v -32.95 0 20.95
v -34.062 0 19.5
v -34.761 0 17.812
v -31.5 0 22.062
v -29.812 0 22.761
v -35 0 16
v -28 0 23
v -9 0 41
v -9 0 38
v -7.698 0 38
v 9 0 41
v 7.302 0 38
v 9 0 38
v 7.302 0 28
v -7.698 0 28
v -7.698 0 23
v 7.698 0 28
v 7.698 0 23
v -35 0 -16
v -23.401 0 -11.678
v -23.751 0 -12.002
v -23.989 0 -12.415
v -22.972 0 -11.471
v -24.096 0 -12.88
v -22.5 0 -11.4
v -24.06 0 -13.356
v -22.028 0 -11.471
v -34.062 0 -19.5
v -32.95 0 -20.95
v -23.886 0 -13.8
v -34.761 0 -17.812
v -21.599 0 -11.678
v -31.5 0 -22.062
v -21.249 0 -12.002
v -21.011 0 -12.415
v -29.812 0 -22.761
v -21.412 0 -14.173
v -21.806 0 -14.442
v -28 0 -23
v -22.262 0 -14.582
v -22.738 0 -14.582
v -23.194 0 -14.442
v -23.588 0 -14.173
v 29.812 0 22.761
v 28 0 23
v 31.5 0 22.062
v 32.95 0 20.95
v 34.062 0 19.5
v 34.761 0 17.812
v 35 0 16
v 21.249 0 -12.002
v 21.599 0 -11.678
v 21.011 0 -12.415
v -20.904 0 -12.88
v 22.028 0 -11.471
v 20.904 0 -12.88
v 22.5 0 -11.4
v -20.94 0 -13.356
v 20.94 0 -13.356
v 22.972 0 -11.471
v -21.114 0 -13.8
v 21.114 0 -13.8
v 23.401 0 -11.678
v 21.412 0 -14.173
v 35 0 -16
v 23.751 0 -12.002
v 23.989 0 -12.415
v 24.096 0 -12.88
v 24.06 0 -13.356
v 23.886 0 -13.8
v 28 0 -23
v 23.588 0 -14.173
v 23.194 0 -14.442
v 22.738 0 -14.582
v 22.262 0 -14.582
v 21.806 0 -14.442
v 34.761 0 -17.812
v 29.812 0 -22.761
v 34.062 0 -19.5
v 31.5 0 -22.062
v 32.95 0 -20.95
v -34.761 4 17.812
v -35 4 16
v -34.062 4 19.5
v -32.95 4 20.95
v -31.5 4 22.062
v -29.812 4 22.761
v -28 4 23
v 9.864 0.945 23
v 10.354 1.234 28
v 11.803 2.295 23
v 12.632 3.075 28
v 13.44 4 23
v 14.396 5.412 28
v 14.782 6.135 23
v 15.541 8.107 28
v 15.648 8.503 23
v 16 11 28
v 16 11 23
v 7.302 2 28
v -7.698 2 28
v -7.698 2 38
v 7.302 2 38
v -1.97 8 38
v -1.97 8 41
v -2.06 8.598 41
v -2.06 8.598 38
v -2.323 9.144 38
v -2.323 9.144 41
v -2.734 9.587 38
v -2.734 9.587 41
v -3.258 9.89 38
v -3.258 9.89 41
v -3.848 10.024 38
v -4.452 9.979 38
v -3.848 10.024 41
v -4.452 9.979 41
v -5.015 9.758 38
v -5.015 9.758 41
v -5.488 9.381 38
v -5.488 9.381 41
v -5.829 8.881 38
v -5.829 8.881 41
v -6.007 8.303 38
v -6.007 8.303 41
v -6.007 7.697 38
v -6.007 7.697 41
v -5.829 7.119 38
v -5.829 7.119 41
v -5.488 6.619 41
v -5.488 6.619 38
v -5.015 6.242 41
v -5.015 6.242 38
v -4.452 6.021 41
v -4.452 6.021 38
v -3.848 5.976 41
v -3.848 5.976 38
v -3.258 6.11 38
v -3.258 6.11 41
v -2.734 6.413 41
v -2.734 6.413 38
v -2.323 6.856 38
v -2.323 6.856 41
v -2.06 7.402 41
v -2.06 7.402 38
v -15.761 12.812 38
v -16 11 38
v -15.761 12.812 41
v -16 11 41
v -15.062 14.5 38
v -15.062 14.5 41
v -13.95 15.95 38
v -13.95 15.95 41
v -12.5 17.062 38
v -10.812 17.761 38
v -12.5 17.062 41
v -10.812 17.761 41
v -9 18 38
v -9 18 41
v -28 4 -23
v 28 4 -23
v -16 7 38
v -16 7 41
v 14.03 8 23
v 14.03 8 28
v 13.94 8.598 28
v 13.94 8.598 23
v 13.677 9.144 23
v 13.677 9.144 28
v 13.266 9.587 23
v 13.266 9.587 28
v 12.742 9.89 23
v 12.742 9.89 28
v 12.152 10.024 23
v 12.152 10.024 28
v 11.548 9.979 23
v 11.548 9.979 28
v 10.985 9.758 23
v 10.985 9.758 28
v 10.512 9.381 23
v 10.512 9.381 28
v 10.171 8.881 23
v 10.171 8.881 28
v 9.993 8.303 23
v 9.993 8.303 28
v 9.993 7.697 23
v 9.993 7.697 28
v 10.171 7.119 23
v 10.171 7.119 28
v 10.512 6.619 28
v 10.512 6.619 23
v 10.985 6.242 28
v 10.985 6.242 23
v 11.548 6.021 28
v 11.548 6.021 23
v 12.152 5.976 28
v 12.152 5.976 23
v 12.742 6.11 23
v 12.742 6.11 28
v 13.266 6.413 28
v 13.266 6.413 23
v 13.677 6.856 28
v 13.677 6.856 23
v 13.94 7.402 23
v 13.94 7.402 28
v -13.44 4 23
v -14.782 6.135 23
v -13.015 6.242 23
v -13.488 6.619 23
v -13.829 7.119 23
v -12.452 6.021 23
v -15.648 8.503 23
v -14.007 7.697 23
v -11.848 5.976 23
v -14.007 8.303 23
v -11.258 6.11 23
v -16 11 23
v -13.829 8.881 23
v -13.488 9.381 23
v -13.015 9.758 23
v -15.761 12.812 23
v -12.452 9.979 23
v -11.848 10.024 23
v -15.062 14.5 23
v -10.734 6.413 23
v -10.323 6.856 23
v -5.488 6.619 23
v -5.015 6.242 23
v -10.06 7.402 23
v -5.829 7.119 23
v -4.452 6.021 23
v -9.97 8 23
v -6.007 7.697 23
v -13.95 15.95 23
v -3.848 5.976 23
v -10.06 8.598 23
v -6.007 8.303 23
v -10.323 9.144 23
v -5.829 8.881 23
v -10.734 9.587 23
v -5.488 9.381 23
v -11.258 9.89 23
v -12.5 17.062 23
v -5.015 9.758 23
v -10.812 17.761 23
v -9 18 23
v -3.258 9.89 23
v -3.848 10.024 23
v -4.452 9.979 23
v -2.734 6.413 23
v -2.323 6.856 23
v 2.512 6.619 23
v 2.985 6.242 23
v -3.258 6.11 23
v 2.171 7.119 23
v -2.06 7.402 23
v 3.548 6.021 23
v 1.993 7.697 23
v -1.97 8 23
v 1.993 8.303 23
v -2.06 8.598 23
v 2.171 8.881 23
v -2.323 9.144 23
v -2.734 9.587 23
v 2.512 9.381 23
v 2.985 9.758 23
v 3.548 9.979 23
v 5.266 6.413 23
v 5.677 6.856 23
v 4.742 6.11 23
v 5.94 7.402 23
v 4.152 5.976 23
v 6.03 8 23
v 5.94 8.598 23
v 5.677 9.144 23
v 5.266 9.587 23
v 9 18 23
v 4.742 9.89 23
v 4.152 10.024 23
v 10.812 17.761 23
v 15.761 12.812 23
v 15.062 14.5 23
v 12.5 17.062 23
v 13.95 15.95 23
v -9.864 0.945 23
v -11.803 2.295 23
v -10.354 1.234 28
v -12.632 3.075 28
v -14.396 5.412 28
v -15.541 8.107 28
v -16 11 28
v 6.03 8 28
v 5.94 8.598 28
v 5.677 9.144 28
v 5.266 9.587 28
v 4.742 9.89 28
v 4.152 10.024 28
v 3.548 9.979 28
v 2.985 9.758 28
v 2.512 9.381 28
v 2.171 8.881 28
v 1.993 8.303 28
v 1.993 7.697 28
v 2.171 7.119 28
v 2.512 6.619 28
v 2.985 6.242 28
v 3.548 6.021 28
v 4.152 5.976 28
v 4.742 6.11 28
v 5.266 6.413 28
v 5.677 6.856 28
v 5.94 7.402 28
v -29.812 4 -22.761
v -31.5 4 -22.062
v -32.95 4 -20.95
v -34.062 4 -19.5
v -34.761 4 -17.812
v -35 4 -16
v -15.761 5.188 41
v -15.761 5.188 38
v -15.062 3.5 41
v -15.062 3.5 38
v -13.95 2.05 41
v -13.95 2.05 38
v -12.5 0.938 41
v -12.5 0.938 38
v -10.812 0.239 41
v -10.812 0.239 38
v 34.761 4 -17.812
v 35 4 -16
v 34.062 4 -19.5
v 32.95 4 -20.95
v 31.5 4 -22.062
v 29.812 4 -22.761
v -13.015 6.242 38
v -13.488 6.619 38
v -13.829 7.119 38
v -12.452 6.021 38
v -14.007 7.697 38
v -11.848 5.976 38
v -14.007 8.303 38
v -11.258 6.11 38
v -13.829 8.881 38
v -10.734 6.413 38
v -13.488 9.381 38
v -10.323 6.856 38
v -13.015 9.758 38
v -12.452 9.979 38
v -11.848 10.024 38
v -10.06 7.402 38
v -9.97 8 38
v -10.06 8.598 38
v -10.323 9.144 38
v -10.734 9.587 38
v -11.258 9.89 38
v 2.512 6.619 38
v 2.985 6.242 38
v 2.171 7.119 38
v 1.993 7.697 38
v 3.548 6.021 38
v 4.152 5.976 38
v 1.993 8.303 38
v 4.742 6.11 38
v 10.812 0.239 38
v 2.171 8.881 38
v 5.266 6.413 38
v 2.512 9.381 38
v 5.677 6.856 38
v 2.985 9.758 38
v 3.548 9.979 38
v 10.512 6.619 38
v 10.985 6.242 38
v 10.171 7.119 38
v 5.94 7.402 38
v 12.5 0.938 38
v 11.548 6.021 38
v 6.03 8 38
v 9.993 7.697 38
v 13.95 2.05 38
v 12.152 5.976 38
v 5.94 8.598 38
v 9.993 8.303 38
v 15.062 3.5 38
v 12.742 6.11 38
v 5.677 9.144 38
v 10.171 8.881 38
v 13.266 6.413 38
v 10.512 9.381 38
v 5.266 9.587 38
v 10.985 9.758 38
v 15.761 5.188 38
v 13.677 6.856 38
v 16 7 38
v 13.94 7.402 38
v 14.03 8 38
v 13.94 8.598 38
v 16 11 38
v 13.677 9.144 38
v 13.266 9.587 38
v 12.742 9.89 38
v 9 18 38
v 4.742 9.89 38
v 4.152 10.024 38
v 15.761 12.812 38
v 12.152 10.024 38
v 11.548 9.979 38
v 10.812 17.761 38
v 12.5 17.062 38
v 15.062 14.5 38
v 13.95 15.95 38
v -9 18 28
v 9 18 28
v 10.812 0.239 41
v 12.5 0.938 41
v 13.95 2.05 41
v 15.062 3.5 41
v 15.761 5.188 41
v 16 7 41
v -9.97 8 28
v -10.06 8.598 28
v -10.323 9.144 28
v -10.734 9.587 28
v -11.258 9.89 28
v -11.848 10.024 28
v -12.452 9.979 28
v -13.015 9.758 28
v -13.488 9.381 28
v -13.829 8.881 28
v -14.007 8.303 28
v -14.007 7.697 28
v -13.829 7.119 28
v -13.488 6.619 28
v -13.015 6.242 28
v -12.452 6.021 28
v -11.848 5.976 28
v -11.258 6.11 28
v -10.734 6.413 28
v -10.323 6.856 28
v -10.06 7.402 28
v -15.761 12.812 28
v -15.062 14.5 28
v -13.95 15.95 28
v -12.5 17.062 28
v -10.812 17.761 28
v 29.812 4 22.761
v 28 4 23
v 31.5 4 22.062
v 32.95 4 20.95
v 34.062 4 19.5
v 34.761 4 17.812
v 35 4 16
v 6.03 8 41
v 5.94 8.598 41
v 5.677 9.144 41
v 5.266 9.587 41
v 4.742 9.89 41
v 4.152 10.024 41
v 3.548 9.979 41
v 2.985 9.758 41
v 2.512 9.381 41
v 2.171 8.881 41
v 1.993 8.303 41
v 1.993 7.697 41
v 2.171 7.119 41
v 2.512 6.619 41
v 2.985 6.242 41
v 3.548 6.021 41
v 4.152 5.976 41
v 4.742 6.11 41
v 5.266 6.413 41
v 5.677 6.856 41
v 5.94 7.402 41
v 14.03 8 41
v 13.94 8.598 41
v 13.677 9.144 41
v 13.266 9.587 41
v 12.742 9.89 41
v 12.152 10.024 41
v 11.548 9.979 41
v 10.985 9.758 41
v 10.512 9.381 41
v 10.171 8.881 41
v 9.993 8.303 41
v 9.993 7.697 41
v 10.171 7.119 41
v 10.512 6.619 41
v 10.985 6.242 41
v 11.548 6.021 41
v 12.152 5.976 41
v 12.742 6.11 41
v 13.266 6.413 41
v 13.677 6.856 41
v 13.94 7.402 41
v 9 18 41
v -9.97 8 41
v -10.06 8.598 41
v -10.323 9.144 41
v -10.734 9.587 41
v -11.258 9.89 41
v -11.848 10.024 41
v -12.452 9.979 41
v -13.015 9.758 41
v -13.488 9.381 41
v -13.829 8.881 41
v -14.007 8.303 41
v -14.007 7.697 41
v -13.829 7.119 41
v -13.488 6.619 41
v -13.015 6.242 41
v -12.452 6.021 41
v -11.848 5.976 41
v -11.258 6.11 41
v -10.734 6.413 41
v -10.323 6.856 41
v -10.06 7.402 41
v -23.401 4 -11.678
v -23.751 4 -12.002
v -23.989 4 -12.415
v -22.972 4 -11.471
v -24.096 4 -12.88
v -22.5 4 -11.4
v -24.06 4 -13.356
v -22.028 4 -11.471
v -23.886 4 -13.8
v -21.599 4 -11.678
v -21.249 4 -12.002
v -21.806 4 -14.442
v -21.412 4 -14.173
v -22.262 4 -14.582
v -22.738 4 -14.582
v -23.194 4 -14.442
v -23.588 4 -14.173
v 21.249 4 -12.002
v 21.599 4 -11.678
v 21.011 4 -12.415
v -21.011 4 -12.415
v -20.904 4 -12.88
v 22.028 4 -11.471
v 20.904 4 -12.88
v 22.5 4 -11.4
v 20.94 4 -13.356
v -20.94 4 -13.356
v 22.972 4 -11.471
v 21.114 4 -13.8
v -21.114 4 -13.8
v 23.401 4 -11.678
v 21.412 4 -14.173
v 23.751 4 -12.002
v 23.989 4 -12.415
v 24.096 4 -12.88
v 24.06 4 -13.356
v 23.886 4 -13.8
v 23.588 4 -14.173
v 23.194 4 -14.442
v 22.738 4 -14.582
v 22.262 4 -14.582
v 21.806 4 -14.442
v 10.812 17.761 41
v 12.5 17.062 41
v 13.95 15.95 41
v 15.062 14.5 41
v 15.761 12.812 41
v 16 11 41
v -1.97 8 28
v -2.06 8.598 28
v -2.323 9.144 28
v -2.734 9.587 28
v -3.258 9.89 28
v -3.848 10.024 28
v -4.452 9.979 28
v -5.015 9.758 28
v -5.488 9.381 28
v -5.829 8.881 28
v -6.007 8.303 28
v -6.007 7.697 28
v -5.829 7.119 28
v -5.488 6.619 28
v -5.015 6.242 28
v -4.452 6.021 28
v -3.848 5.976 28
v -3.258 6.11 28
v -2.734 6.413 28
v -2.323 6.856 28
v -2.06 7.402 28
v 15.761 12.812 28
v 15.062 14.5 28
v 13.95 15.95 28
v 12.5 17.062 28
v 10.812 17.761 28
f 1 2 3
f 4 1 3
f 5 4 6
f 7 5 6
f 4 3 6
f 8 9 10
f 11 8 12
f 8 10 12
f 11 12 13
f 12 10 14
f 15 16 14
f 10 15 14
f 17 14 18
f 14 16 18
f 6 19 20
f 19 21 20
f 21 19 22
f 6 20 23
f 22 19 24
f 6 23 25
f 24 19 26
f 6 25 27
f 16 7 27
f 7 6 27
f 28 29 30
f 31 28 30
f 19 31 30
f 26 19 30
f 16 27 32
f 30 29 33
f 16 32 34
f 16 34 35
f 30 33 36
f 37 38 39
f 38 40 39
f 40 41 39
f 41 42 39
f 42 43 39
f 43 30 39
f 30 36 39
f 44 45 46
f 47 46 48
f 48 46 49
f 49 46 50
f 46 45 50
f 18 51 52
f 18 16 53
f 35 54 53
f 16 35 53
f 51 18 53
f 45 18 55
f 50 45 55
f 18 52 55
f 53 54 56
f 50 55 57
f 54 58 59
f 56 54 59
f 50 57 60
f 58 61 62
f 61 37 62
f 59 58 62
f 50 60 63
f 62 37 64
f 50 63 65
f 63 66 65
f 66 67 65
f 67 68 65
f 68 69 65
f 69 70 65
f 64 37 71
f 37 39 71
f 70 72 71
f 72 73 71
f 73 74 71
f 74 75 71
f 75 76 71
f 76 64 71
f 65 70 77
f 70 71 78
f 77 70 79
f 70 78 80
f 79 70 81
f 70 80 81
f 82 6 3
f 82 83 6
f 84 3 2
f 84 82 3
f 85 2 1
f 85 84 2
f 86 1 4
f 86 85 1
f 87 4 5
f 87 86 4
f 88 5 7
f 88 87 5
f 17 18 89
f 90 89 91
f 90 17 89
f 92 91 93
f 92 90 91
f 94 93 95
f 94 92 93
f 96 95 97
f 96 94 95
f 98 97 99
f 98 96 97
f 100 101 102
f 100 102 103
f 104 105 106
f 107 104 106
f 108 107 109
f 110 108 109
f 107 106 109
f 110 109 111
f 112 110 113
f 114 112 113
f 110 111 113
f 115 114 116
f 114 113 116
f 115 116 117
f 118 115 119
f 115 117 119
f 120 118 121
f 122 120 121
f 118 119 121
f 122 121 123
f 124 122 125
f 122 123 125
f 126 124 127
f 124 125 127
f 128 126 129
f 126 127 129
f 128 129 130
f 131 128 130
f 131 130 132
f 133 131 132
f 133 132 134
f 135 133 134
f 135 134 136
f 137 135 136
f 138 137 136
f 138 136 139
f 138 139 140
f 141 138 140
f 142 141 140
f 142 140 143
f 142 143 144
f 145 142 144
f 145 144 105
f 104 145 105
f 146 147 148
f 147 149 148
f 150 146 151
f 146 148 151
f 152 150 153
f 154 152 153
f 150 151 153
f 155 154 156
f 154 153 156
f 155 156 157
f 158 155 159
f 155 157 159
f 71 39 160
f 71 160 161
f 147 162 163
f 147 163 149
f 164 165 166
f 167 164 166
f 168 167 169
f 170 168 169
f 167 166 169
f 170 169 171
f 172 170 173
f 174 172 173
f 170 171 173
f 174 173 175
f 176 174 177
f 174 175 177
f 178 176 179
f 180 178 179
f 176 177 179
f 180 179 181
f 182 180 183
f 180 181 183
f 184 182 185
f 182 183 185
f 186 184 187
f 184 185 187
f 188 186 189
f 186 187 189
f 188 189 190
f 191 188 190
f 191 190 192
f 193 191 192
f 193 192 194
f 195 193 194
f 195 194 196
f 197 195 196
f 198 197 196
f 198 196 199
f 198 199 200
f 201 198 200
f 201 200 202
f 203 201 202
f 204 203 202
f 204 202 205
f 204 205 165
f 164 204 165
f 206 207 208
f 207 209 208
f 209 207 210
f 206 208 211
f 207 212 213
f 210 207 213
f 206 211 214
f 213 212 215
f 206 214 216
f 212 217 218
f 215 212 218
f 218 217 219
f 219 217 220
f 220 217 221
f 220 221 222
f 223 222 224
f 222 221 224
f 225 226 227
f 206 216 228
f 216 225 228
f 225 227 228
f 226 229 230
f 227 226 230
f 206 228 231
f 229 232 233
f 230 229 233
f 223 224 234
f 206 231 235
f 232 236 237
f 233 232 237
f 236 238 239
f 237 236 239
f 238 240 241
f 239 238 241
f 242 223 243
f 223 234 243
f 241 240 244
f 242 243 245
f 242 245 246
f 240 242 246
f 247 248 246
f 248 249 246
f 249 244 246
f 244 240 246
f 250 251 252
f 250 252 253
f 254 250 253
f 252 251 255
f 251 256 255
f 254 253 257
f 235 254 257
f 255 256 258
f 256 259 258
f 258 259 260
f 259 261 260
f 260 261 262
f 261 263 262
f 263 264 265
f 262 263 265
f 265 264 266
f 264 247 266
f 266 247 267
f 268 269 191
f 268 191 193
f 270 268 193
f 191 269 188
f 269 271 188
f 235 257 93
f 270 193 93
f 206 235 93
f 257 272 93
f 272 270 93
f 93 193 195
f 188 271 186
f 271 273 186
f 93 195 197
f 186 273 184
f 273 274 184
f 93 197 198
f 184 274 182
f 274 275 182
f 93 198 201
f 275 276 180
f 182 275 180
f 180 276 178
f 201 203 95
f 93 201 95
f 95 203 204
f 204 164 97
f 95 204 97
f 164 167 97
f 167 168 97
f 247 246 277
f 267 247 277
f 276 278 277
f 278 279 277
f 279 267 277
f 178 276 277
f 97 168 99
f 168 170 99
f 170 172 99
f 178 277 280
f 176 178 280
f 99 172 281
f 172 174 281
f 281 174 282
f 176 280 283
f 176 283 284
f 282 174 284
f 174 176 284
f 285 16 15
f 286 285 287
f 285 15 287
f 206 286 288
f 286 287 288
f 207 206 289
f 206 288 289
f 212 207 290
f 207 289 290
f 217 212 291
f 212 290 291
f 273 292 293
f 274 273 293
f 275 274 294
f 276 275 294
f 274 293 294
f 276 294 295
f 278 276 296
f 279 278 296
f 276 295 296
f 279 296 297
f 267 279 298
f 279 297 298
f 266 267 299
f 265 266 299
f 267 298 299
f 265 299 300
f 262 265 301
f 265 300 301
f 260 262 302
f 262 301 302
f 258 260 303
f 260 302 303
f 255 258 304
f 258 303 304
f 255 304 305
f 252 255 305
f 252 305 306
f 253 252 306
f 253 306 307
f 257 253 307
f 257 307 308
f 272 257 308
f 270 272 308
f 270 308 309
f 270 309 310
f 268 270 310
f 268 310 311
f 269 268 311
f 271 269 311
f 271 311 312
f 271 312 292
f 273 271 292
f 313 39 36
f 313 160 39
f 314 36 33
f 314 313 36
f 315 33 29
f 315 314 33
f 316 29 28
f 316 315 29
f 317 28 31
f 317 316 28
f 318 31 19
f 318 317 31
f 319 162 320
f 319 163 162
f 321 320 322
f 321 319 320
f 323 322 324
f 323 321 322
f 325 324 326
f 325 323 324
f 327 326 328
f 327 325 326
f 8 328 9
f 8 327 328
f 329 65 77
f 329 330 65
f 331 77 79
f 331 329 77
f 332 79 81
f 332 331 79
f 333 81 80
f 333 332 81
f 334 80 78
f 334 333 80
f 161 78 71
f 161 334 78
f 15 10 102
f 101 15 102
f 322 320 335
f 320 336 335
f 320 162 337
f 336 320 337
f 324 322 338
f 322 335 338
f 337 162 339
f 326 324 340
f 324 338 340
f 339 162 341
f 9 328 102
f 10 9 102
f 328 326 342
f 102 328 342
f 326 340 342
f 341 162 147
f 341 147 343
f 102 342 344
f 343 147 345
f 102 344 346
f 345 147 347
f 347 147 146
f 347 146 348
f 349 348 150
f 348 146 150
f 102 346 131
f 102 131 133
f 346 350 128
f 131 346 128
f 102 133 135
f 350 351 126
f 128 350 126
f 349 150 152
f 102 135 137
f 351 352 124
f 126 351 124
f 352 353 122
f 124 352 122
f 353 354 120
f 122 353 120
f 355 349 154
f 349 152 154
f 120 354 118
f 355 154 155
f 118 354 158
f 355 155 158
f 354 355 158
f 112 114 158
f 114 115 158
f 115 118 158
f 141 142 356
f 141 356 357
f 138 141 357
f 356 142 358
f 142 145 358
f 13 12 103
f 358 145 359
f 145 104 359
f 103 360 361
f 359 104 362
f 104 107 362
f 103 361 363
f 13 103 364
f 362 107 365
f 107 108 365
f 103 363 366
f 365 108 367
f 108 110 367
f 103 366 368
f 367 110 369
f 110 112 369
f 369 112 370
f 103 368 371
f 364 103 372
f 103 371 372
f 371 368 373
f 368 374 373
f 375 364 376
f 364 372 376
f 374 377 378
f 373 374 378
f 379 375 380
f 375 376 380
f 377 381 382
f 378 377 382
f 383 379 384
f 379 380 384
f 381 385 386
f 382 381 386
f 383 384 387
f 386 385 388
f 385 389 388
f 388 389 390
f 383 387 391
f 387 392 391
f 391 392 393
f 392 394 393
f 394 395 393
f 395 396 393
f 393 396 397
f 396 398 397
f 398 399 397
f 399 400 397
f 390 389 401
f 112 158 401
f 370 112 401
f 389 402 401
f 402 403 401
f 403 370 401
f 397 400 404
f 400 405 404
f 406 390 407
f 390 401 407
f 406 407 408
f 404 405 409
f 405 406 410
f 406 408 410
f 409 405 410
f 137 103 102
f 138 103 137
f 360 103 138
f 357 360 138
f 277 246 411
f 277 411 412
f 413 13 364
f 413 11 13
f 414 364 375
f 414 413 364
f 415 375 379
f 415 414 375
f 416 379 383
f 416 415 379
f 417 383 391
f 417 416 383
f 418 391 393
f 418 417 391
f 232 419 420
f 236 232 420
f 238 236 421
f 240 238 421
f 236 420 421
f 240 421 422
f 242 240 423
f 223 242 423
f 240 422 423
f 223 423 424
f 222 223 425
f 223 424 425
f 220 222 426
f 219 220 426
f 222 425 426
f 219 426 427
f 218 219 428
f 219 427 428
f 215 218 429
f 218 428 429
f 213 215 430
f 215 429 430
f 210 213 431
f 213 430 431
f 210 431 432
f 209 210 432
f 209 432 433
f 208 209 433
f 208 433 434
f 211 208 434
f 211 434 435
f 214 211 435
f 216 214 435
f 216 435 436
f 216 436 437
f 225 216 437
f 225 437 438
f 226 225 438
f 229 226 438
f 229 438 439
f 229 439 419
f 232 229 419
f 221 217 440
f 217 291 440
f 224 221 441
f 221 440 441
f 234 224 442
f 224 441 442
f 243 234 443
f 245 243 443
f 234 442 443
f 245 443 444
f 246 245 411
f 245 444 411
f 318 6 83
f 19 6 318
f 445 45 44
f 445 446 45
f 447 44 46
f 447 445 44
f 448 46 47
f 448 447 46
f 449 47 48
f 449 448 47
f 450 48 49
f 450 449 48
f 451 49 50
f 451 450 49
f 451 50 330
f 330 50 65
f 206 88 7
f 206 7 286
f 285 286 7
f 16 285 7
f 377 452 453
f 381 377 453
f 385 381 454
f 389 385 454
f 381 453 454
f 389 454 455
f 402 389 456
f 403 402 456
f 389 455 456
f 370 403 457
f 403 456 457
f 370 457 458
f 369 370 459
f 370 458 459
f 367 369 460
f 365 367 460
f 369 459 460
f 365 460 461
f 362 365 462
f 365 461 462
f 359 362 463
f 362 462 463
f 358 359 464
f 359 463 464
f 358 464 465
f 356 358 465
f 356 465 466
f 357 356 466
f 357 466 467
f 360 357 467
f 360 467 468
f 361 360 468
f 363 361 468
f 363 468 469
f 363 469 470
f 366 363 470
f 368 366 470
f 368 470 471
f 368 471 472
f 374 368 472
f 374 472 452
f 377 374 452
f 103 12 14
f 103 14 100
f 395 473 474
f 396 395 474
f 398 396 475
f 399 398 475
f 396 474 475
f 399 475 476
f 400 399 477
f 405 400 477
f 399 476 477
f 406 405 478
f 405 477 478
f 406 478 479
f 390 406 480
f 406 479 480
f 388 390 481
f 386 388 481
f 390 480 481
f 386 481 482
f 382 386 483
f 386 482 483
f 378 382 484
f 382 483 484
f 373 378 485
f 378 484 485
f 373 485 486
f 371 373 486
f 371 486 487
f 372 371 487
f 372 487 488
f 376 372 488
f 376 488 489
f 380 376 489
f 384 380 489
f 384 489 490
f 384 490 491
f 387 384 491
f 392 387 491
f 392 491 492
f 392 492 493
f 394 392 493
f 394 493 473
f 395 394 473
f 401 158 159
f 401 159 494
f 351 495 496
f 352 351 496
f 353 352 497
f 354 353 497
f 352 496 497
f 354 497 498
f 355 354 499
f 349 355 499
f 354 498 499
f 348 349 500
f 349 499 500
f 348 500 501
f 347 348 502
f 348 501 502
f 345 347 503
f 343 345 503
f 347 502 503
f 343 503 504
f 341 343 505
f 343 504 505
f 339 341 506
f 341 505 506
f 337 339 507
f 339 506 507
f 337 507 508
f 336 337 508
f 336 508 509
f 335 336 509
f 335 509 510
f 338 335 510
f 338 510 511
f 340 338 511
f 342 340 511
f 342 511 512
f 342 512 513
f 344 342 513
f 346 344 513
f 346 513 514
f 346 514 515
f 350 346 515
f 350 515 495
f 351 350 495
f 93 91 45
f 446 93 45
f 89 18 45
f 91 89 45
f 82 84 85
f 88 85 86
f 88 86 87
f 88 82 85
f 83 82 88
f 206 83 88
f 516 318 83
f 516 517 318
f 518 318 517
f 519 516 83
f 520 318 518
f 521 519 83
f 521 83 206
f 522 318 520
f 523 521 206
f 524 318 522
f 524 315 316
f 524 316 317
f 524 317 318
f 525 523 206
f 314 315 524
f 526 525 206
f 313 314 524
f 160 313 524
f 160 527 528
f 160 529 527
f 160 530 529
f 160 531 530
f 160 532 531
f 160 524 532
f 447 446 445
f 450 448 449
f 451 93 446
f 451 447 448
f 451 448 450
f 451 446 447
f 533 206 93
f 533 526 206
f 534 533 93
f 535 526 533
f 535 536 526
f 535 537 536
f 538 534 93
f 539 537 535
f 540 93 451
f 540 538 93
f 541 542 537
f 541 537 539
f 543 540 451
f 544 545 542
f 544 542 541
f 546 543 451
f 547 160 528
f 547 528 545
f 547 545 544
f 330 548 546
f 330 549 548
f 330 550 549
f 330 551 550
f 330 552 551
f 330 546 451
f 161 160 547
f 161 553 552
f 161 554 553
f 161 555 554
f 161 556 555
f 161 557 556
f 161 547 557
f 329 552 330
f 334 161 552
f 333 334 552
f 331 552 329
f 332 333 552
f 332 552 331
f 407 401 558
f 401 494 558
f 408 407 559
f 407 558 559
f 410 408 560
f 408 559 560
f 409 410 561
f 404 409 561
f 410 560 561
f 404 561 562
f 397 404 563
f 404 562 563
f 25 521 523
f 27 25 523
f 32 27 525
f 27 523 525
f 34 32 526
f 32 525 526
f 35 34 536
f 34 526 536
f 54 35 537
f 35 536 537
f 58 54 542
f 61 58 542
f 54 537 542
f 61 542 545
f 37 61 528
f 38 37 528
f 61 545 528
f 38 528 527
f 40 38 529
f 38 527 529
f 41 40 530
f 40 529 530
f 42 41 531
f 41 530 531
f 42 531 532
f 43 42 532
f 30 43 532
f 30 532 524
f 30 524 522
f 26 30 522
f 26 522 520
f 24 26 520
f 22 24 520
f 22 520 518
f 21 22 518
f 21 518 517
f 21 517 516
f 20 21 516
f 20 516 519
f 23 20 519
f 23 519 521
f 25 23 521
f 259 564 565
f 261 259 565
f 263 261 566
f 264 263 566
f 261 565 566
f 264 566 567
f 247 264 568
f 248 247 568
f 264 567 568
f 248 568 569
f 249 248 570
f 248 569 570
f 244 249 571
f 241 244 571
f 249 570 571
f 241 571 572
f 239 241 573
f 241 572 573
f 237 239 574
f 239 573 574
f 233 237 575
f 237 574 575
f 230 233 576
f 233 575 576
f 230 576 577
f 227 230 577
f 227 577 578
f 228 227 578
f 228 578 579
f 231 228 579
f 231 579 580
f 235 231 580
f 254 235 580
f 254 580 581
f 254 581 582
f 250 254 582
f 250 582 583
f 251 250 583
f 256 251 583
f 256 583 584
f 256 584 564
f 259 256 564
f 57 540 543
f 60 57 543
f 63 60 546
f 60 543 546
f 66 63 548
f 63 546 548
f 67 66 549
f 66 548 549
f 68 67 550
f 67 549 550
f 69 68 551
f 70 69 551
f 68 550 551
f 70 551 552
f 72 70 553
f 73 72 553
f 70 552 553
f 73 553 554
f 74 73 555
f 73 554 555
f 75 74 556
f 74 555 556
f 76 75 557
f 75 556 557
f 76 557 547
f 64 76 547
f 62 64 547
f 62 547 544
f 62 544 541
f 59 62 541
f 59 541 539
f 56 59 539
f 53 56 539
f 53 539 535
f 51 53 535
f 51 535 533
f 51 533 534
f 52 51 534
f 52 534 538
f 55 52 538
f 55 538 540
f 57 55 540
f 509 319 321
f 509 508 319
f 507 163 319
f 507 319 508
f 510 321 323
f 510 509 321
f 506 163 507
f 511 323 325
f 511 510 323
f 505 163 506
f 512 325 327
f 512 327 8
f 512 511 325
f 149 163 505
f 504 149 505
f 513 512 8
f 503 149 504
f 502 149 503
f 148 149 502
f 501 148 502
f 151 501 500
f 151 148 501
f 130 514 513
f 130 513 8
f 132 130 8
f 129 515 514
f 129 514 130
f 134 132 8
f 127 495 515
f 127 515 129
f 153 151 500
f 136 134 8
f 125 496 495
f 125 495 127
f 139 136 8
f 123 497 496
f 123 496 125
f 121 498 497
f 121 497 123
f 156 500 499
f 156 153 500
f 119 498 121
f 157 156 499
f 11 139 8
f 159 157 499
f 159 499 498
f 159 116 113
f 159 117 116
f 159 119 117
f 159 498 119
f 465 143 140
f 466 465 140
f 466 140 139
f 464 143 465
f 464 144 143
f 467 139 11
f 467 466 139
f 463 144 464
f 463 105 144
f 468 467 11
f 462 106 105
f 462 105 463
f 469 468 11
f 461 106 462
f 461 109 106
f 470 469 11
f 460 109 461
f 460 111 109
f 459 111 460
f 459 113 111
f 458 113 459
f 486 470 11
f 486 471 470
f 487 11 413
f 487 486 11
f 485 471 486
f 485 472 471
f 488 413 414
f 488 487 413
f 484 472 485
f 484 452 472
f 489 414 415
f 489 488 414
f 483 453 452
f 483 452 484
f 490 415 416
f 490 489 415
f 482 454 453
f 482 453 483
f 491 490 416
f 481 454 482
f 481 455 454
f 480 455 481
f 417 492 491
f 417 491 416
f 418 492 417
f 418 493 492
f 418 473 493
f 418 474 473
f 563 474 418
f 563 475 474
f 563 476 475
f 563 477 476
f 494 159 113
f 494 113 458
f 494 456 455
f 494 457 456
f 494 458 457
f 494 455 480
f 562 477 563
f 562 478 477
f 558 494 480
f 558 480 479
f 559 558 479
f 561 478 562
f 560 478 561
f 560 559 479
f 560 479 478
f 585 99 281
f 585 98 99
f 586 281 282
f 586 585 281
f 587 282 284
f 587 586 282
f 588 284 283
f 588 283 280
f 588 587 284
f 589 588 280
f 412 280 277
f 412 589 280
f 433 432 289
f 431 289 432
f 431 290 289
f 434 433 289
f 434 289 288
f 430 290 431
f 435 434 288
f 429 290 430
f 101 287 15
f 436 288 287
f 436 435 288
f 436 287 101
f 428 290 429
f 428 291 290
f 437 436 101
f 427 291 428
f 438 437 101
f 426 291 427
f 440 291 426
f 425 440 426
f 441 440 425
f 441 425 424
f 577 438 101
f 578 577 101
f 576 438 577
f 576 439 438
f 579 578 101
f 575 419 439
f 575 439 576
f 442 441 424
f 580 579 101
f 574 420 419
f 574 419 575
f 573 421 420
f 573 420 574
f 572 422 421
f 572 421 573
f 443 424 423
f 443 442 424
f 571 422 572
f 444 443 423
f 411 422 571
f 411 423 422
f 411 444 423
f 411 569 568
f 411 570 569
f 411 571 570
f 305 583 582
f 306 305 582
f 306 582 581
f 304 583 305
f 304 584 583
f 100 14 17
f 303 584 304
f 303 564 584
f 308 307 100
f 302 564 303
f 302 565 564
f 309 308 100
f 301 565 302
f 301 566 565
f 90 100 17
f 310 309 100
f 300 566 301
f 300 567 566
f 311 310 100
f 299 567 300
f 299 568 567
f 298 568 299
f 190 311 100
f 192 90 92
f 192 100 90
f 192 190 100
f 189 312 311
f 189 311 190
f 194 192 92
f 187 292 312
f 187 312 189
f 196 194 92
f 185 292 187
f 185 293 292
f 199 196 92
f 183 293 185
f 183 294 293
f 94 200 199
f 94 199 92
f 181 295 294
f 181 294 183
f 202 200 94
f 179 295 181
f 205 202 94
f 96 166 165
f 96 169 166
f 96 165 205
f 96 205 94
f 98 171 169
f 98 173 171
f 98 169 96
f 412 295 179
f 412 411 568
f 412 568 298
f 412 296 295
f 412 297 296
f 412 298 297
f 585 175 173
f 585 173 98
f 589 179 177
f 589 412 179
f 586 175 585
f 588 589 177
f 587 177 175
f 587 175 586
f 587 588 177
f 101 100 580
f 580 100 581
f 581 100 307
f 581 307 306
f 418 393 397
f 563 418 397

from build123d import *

# Parameters (mm, degrees)
SKETCH_1_W          = 70
SKETCH_1_H          = 46
EXTRUDE_1_DEPTH     = 4
CUT_EXTRUDE_1_REACH = 44.071
SKETCH_2_R          = 1.6
SKETCH_3_W          = 32
SKETCH_3_H          = 18
EXTRUDE_2_DEPTH     = 5
SKETCH_4_W          = 15
SKETCH_4_H          = 2
EXTRUDE_3_DEPTH     = 10
SKETCH_5_W          = 32
SKETCH_5_H          = 18
EXTRUDE_4_DEPTH     = 3
CUT_EXTRUDE_2_REACH = 77.133
SKETCH_6_R          = 2.03
FILLET_2_R          = 7
CUT_EXTRUDE_3_DEPTH = 5


with BuildPart() as part:
    # 草图1 → 凸台-拉伸1 (new body)
    with BuildSketch(Plane(origin=(0, 0, 0), x_dir=(1, 0, 0), z_dir=(0, 1, 0))):
        Rectangle(SKETCH_1_W, SKETCH_1_H)
    extrude(amount=EXTRUDE_1_DEPTH)

    # 草图2 → 切除-拉伸1 (cut, up to next)
    with BuildSketch(Plane(origin=(0, 4, 0), x_dir=(1, 0, 0), z_dir=(0, 1, 0)), mode=Mode.PRIVATE) as cut_extrude_1_sk1:
        with Locations(Location((-22.5, 13, 0), (0, 0, 270))):
            Circle(SKETCH_2_R)
    cut_extrude_1_tool1 = extrude(cut_extrude_1_sk1.sketch, amount=-CUT_EXTRUDE_1_REACH, mode=Mode.PRIVATE) & part.part
    # 草图2 → 切除-拉伸1 (cut, up to next)
    with BuildSketch(Plane(origin=(0, 4, 0), x_dir=(1, 0, 0), z_dir=(0, 1, 0)), mode=Mode.PRIVATE) as cut_extrude_1_sk2:
        with Locations(Location((22.5, 13, 0), (0, 0, 270))):
            Circle(SKETCH_2_R)
    cut_extrude_1_tool2 = extrude(cut_extrude_1_sk2.sketch, amount=-CUT_EXTRUDE_1_REACH, mode=Mode.PRIVATE) & part.part
    add(cut_extrude_1_tool1.solids().sort_by_distance((-22.5, 4, -13))[0], mode=Mode.SUBTRACT)
    add(cut_extrude_1_tool2.solids().sort_by_distance((22.5, 4, -13))[0], mode=Mode.SUBTRACT)

    # 草图3 → 凸台-拉伸2 (add)
    with BuildSketch(Plane.XY.offset(23)):
        with Locations((0, 9)):
            Rectangle(SKETCH_3_W, SKETCH_3_H)
    extrude(amount=EXTRUDE_2_DEPTH)

    # 草图4 → 凸台-拉伸3 (add)
    with BuildSketch(Plane.XY.offset(28)):
        with Locations((-0.197819001, 1)):
            Rectangle(SKETCH_4_W, SKETCH_4_H)
    extrude(amount=EXTRUDE_3_DEPTH)

    # 草图5 → 凸台-拉伸4 (add)
    with BuildSketch(Plane.XY.offset(38)):
        with Locations((0, 9)):
            Rectangle(SKETCH_5_W, SKETCH_5_H)
    extrude(amount=EXTRUDE_4_DEPTH)

    # 切除-拉伸2: up to this face of the body (flat: up to its plane)
    cut_extrude_2_end = Plane(part.part.faces().sort_by_distance((0, 11, 23))[0])
    # 草图6 → 切除-拉伸2 (cut, up to the picked face)
    with BuildSketch(Plane.XY.offset(41), mode=Mode.PRIVATE) as cut_extrude_2_sk1:
        with Locations((-12, 8)):
            Circle(SKETCH_6_R)
    cut_extrude_2_tool1 = split(extrude(cut_extrude_2_sk1.sketch, amount=-CUT_EXTRUDE_2_REACH, mode=Mode.PRIVATE), bisect_by=cut_extrude_2_end, keep=Keep.BOTH, mode=Mode.PRIVATE)
    # 草图6 → 切除-拉伸2 (cut, up to the picked face)
    with BuildSketch(Plane.XY.offset(41), mode=Mode.PRIVATE) as cut_extrude_2_sk2:
        with Locations((-4, 8)):
            Circle(SKETCH_6_R)
    cut_extrude_2_tool2 = split(extrude(cut_extrude_2_sk2.sketch, amount=-CUT_EXTRUDE_2_REACH, mode=Mode.PRIVATE), bisect_by=cut_extrude_2_end, keep=Keep.BOTH, mode=Mode.PRIVATE)
    # 草图6 → 切除-拉伸2 (cut, up to the picked face)
    with BuildSketch(Plane.XY.offset(41), mode=Mode.PRIVATE) as cut_extrude_2_sk3:
        with Locations((4, 8)):
            Circle(SKETCH_6_R)
    cut_extrude_2_tool3 = split(extrude(cut_extrude_2_sk3.sketch, amount=-CUT_EXTRUDE_2_REACH, mode=Mode.PRIVATE), bisect_by=cut_extrude_2_end, keep=Keep.BOTH, mode=Mode.PRIVATE)
    # 草图6 → 切除-拉伸2 (cut, up to the picked face)
    with BuildSketch(Plane.XY.offset(41), mode=Mode.PRIVATE) as cut_extrude_2_sk4:
        with Locations((12, 8)):
            Circle(SKETCH_6_R)
    cut_extrude_2_tool4 = split(extrude(cut_extrude_2_sk4.sketch, amount=-CUT_EXTRUDE_2_REACH, mode=Mode.PRIVATE), bisect_by=cut_extrude_2_end, keep=Keep.BOTH, mode=Mode.PRIVATE)
    add(cut_extrude_2_tool1.solids().sort_by(Axis((-12, 8, 41), (0, 0, -1)))[0], mode=Mode.SUBTRACT)
    add(cut_extrude_2_tool2.solids().sort_by(Axis((-4, 8, 41), (0, 0, -1)))[0], mode=Mode.SUBTRACT)
    add(cut_extrude_2_tool3.solids().sort_by(Axis((4, 8, 41), (0, 0, -1)))[0], mode=Mode.SUBTRACT)
    add(cut_extrude_2_tool4.solids().sort_by(Axis((12, 8, 41), (0, 0, -1)))[0], mode=Mode.SUBTRACT)

    # 圆角2
    fillet_2_edges = [part.edges().sort_by_distance(p)[0] for p in [
        (-16, 18, 25.5),
        (16, 18, 25.5),
        (-16, 18, 39.5),
        (-16, 0, 39.5),
        (16, 0, 39.5),
        (16, 18, 39.5),
        (35, 2, 23),
        (-35, 2, 23),
        (-35, 2, -23),
        (35, 2, -23),
    ]]
    fillet(fillet_2_edges, radius=FILLET_2_R)

    # 草图10 → 切除-拉伸3 (cut)
    with BuildSketch(Plane.XY.offset(28)):
        with BuildLine():
            Line((-16, 11), (-16, 0))
            Line((-16, 0), (-7.697819001, 0))
            ThreePointArc((-7.697819001, 0), (-13.585443233, 4.189362059), (-16, 11))
        make_face()
        with BuildLine():
            Line((16, 0), (7.697819001, 0))
            ThreePointArc((7.697819001, 0), (13.585443233, 4.189362059), (16, 11))
            Line((16, 11), (16, 0))
        make_face()
    extrude(amount=-CUT_EXTRUDE_3_DEPTH, mode=Mode.SUBTRACT)


solid = part.part
